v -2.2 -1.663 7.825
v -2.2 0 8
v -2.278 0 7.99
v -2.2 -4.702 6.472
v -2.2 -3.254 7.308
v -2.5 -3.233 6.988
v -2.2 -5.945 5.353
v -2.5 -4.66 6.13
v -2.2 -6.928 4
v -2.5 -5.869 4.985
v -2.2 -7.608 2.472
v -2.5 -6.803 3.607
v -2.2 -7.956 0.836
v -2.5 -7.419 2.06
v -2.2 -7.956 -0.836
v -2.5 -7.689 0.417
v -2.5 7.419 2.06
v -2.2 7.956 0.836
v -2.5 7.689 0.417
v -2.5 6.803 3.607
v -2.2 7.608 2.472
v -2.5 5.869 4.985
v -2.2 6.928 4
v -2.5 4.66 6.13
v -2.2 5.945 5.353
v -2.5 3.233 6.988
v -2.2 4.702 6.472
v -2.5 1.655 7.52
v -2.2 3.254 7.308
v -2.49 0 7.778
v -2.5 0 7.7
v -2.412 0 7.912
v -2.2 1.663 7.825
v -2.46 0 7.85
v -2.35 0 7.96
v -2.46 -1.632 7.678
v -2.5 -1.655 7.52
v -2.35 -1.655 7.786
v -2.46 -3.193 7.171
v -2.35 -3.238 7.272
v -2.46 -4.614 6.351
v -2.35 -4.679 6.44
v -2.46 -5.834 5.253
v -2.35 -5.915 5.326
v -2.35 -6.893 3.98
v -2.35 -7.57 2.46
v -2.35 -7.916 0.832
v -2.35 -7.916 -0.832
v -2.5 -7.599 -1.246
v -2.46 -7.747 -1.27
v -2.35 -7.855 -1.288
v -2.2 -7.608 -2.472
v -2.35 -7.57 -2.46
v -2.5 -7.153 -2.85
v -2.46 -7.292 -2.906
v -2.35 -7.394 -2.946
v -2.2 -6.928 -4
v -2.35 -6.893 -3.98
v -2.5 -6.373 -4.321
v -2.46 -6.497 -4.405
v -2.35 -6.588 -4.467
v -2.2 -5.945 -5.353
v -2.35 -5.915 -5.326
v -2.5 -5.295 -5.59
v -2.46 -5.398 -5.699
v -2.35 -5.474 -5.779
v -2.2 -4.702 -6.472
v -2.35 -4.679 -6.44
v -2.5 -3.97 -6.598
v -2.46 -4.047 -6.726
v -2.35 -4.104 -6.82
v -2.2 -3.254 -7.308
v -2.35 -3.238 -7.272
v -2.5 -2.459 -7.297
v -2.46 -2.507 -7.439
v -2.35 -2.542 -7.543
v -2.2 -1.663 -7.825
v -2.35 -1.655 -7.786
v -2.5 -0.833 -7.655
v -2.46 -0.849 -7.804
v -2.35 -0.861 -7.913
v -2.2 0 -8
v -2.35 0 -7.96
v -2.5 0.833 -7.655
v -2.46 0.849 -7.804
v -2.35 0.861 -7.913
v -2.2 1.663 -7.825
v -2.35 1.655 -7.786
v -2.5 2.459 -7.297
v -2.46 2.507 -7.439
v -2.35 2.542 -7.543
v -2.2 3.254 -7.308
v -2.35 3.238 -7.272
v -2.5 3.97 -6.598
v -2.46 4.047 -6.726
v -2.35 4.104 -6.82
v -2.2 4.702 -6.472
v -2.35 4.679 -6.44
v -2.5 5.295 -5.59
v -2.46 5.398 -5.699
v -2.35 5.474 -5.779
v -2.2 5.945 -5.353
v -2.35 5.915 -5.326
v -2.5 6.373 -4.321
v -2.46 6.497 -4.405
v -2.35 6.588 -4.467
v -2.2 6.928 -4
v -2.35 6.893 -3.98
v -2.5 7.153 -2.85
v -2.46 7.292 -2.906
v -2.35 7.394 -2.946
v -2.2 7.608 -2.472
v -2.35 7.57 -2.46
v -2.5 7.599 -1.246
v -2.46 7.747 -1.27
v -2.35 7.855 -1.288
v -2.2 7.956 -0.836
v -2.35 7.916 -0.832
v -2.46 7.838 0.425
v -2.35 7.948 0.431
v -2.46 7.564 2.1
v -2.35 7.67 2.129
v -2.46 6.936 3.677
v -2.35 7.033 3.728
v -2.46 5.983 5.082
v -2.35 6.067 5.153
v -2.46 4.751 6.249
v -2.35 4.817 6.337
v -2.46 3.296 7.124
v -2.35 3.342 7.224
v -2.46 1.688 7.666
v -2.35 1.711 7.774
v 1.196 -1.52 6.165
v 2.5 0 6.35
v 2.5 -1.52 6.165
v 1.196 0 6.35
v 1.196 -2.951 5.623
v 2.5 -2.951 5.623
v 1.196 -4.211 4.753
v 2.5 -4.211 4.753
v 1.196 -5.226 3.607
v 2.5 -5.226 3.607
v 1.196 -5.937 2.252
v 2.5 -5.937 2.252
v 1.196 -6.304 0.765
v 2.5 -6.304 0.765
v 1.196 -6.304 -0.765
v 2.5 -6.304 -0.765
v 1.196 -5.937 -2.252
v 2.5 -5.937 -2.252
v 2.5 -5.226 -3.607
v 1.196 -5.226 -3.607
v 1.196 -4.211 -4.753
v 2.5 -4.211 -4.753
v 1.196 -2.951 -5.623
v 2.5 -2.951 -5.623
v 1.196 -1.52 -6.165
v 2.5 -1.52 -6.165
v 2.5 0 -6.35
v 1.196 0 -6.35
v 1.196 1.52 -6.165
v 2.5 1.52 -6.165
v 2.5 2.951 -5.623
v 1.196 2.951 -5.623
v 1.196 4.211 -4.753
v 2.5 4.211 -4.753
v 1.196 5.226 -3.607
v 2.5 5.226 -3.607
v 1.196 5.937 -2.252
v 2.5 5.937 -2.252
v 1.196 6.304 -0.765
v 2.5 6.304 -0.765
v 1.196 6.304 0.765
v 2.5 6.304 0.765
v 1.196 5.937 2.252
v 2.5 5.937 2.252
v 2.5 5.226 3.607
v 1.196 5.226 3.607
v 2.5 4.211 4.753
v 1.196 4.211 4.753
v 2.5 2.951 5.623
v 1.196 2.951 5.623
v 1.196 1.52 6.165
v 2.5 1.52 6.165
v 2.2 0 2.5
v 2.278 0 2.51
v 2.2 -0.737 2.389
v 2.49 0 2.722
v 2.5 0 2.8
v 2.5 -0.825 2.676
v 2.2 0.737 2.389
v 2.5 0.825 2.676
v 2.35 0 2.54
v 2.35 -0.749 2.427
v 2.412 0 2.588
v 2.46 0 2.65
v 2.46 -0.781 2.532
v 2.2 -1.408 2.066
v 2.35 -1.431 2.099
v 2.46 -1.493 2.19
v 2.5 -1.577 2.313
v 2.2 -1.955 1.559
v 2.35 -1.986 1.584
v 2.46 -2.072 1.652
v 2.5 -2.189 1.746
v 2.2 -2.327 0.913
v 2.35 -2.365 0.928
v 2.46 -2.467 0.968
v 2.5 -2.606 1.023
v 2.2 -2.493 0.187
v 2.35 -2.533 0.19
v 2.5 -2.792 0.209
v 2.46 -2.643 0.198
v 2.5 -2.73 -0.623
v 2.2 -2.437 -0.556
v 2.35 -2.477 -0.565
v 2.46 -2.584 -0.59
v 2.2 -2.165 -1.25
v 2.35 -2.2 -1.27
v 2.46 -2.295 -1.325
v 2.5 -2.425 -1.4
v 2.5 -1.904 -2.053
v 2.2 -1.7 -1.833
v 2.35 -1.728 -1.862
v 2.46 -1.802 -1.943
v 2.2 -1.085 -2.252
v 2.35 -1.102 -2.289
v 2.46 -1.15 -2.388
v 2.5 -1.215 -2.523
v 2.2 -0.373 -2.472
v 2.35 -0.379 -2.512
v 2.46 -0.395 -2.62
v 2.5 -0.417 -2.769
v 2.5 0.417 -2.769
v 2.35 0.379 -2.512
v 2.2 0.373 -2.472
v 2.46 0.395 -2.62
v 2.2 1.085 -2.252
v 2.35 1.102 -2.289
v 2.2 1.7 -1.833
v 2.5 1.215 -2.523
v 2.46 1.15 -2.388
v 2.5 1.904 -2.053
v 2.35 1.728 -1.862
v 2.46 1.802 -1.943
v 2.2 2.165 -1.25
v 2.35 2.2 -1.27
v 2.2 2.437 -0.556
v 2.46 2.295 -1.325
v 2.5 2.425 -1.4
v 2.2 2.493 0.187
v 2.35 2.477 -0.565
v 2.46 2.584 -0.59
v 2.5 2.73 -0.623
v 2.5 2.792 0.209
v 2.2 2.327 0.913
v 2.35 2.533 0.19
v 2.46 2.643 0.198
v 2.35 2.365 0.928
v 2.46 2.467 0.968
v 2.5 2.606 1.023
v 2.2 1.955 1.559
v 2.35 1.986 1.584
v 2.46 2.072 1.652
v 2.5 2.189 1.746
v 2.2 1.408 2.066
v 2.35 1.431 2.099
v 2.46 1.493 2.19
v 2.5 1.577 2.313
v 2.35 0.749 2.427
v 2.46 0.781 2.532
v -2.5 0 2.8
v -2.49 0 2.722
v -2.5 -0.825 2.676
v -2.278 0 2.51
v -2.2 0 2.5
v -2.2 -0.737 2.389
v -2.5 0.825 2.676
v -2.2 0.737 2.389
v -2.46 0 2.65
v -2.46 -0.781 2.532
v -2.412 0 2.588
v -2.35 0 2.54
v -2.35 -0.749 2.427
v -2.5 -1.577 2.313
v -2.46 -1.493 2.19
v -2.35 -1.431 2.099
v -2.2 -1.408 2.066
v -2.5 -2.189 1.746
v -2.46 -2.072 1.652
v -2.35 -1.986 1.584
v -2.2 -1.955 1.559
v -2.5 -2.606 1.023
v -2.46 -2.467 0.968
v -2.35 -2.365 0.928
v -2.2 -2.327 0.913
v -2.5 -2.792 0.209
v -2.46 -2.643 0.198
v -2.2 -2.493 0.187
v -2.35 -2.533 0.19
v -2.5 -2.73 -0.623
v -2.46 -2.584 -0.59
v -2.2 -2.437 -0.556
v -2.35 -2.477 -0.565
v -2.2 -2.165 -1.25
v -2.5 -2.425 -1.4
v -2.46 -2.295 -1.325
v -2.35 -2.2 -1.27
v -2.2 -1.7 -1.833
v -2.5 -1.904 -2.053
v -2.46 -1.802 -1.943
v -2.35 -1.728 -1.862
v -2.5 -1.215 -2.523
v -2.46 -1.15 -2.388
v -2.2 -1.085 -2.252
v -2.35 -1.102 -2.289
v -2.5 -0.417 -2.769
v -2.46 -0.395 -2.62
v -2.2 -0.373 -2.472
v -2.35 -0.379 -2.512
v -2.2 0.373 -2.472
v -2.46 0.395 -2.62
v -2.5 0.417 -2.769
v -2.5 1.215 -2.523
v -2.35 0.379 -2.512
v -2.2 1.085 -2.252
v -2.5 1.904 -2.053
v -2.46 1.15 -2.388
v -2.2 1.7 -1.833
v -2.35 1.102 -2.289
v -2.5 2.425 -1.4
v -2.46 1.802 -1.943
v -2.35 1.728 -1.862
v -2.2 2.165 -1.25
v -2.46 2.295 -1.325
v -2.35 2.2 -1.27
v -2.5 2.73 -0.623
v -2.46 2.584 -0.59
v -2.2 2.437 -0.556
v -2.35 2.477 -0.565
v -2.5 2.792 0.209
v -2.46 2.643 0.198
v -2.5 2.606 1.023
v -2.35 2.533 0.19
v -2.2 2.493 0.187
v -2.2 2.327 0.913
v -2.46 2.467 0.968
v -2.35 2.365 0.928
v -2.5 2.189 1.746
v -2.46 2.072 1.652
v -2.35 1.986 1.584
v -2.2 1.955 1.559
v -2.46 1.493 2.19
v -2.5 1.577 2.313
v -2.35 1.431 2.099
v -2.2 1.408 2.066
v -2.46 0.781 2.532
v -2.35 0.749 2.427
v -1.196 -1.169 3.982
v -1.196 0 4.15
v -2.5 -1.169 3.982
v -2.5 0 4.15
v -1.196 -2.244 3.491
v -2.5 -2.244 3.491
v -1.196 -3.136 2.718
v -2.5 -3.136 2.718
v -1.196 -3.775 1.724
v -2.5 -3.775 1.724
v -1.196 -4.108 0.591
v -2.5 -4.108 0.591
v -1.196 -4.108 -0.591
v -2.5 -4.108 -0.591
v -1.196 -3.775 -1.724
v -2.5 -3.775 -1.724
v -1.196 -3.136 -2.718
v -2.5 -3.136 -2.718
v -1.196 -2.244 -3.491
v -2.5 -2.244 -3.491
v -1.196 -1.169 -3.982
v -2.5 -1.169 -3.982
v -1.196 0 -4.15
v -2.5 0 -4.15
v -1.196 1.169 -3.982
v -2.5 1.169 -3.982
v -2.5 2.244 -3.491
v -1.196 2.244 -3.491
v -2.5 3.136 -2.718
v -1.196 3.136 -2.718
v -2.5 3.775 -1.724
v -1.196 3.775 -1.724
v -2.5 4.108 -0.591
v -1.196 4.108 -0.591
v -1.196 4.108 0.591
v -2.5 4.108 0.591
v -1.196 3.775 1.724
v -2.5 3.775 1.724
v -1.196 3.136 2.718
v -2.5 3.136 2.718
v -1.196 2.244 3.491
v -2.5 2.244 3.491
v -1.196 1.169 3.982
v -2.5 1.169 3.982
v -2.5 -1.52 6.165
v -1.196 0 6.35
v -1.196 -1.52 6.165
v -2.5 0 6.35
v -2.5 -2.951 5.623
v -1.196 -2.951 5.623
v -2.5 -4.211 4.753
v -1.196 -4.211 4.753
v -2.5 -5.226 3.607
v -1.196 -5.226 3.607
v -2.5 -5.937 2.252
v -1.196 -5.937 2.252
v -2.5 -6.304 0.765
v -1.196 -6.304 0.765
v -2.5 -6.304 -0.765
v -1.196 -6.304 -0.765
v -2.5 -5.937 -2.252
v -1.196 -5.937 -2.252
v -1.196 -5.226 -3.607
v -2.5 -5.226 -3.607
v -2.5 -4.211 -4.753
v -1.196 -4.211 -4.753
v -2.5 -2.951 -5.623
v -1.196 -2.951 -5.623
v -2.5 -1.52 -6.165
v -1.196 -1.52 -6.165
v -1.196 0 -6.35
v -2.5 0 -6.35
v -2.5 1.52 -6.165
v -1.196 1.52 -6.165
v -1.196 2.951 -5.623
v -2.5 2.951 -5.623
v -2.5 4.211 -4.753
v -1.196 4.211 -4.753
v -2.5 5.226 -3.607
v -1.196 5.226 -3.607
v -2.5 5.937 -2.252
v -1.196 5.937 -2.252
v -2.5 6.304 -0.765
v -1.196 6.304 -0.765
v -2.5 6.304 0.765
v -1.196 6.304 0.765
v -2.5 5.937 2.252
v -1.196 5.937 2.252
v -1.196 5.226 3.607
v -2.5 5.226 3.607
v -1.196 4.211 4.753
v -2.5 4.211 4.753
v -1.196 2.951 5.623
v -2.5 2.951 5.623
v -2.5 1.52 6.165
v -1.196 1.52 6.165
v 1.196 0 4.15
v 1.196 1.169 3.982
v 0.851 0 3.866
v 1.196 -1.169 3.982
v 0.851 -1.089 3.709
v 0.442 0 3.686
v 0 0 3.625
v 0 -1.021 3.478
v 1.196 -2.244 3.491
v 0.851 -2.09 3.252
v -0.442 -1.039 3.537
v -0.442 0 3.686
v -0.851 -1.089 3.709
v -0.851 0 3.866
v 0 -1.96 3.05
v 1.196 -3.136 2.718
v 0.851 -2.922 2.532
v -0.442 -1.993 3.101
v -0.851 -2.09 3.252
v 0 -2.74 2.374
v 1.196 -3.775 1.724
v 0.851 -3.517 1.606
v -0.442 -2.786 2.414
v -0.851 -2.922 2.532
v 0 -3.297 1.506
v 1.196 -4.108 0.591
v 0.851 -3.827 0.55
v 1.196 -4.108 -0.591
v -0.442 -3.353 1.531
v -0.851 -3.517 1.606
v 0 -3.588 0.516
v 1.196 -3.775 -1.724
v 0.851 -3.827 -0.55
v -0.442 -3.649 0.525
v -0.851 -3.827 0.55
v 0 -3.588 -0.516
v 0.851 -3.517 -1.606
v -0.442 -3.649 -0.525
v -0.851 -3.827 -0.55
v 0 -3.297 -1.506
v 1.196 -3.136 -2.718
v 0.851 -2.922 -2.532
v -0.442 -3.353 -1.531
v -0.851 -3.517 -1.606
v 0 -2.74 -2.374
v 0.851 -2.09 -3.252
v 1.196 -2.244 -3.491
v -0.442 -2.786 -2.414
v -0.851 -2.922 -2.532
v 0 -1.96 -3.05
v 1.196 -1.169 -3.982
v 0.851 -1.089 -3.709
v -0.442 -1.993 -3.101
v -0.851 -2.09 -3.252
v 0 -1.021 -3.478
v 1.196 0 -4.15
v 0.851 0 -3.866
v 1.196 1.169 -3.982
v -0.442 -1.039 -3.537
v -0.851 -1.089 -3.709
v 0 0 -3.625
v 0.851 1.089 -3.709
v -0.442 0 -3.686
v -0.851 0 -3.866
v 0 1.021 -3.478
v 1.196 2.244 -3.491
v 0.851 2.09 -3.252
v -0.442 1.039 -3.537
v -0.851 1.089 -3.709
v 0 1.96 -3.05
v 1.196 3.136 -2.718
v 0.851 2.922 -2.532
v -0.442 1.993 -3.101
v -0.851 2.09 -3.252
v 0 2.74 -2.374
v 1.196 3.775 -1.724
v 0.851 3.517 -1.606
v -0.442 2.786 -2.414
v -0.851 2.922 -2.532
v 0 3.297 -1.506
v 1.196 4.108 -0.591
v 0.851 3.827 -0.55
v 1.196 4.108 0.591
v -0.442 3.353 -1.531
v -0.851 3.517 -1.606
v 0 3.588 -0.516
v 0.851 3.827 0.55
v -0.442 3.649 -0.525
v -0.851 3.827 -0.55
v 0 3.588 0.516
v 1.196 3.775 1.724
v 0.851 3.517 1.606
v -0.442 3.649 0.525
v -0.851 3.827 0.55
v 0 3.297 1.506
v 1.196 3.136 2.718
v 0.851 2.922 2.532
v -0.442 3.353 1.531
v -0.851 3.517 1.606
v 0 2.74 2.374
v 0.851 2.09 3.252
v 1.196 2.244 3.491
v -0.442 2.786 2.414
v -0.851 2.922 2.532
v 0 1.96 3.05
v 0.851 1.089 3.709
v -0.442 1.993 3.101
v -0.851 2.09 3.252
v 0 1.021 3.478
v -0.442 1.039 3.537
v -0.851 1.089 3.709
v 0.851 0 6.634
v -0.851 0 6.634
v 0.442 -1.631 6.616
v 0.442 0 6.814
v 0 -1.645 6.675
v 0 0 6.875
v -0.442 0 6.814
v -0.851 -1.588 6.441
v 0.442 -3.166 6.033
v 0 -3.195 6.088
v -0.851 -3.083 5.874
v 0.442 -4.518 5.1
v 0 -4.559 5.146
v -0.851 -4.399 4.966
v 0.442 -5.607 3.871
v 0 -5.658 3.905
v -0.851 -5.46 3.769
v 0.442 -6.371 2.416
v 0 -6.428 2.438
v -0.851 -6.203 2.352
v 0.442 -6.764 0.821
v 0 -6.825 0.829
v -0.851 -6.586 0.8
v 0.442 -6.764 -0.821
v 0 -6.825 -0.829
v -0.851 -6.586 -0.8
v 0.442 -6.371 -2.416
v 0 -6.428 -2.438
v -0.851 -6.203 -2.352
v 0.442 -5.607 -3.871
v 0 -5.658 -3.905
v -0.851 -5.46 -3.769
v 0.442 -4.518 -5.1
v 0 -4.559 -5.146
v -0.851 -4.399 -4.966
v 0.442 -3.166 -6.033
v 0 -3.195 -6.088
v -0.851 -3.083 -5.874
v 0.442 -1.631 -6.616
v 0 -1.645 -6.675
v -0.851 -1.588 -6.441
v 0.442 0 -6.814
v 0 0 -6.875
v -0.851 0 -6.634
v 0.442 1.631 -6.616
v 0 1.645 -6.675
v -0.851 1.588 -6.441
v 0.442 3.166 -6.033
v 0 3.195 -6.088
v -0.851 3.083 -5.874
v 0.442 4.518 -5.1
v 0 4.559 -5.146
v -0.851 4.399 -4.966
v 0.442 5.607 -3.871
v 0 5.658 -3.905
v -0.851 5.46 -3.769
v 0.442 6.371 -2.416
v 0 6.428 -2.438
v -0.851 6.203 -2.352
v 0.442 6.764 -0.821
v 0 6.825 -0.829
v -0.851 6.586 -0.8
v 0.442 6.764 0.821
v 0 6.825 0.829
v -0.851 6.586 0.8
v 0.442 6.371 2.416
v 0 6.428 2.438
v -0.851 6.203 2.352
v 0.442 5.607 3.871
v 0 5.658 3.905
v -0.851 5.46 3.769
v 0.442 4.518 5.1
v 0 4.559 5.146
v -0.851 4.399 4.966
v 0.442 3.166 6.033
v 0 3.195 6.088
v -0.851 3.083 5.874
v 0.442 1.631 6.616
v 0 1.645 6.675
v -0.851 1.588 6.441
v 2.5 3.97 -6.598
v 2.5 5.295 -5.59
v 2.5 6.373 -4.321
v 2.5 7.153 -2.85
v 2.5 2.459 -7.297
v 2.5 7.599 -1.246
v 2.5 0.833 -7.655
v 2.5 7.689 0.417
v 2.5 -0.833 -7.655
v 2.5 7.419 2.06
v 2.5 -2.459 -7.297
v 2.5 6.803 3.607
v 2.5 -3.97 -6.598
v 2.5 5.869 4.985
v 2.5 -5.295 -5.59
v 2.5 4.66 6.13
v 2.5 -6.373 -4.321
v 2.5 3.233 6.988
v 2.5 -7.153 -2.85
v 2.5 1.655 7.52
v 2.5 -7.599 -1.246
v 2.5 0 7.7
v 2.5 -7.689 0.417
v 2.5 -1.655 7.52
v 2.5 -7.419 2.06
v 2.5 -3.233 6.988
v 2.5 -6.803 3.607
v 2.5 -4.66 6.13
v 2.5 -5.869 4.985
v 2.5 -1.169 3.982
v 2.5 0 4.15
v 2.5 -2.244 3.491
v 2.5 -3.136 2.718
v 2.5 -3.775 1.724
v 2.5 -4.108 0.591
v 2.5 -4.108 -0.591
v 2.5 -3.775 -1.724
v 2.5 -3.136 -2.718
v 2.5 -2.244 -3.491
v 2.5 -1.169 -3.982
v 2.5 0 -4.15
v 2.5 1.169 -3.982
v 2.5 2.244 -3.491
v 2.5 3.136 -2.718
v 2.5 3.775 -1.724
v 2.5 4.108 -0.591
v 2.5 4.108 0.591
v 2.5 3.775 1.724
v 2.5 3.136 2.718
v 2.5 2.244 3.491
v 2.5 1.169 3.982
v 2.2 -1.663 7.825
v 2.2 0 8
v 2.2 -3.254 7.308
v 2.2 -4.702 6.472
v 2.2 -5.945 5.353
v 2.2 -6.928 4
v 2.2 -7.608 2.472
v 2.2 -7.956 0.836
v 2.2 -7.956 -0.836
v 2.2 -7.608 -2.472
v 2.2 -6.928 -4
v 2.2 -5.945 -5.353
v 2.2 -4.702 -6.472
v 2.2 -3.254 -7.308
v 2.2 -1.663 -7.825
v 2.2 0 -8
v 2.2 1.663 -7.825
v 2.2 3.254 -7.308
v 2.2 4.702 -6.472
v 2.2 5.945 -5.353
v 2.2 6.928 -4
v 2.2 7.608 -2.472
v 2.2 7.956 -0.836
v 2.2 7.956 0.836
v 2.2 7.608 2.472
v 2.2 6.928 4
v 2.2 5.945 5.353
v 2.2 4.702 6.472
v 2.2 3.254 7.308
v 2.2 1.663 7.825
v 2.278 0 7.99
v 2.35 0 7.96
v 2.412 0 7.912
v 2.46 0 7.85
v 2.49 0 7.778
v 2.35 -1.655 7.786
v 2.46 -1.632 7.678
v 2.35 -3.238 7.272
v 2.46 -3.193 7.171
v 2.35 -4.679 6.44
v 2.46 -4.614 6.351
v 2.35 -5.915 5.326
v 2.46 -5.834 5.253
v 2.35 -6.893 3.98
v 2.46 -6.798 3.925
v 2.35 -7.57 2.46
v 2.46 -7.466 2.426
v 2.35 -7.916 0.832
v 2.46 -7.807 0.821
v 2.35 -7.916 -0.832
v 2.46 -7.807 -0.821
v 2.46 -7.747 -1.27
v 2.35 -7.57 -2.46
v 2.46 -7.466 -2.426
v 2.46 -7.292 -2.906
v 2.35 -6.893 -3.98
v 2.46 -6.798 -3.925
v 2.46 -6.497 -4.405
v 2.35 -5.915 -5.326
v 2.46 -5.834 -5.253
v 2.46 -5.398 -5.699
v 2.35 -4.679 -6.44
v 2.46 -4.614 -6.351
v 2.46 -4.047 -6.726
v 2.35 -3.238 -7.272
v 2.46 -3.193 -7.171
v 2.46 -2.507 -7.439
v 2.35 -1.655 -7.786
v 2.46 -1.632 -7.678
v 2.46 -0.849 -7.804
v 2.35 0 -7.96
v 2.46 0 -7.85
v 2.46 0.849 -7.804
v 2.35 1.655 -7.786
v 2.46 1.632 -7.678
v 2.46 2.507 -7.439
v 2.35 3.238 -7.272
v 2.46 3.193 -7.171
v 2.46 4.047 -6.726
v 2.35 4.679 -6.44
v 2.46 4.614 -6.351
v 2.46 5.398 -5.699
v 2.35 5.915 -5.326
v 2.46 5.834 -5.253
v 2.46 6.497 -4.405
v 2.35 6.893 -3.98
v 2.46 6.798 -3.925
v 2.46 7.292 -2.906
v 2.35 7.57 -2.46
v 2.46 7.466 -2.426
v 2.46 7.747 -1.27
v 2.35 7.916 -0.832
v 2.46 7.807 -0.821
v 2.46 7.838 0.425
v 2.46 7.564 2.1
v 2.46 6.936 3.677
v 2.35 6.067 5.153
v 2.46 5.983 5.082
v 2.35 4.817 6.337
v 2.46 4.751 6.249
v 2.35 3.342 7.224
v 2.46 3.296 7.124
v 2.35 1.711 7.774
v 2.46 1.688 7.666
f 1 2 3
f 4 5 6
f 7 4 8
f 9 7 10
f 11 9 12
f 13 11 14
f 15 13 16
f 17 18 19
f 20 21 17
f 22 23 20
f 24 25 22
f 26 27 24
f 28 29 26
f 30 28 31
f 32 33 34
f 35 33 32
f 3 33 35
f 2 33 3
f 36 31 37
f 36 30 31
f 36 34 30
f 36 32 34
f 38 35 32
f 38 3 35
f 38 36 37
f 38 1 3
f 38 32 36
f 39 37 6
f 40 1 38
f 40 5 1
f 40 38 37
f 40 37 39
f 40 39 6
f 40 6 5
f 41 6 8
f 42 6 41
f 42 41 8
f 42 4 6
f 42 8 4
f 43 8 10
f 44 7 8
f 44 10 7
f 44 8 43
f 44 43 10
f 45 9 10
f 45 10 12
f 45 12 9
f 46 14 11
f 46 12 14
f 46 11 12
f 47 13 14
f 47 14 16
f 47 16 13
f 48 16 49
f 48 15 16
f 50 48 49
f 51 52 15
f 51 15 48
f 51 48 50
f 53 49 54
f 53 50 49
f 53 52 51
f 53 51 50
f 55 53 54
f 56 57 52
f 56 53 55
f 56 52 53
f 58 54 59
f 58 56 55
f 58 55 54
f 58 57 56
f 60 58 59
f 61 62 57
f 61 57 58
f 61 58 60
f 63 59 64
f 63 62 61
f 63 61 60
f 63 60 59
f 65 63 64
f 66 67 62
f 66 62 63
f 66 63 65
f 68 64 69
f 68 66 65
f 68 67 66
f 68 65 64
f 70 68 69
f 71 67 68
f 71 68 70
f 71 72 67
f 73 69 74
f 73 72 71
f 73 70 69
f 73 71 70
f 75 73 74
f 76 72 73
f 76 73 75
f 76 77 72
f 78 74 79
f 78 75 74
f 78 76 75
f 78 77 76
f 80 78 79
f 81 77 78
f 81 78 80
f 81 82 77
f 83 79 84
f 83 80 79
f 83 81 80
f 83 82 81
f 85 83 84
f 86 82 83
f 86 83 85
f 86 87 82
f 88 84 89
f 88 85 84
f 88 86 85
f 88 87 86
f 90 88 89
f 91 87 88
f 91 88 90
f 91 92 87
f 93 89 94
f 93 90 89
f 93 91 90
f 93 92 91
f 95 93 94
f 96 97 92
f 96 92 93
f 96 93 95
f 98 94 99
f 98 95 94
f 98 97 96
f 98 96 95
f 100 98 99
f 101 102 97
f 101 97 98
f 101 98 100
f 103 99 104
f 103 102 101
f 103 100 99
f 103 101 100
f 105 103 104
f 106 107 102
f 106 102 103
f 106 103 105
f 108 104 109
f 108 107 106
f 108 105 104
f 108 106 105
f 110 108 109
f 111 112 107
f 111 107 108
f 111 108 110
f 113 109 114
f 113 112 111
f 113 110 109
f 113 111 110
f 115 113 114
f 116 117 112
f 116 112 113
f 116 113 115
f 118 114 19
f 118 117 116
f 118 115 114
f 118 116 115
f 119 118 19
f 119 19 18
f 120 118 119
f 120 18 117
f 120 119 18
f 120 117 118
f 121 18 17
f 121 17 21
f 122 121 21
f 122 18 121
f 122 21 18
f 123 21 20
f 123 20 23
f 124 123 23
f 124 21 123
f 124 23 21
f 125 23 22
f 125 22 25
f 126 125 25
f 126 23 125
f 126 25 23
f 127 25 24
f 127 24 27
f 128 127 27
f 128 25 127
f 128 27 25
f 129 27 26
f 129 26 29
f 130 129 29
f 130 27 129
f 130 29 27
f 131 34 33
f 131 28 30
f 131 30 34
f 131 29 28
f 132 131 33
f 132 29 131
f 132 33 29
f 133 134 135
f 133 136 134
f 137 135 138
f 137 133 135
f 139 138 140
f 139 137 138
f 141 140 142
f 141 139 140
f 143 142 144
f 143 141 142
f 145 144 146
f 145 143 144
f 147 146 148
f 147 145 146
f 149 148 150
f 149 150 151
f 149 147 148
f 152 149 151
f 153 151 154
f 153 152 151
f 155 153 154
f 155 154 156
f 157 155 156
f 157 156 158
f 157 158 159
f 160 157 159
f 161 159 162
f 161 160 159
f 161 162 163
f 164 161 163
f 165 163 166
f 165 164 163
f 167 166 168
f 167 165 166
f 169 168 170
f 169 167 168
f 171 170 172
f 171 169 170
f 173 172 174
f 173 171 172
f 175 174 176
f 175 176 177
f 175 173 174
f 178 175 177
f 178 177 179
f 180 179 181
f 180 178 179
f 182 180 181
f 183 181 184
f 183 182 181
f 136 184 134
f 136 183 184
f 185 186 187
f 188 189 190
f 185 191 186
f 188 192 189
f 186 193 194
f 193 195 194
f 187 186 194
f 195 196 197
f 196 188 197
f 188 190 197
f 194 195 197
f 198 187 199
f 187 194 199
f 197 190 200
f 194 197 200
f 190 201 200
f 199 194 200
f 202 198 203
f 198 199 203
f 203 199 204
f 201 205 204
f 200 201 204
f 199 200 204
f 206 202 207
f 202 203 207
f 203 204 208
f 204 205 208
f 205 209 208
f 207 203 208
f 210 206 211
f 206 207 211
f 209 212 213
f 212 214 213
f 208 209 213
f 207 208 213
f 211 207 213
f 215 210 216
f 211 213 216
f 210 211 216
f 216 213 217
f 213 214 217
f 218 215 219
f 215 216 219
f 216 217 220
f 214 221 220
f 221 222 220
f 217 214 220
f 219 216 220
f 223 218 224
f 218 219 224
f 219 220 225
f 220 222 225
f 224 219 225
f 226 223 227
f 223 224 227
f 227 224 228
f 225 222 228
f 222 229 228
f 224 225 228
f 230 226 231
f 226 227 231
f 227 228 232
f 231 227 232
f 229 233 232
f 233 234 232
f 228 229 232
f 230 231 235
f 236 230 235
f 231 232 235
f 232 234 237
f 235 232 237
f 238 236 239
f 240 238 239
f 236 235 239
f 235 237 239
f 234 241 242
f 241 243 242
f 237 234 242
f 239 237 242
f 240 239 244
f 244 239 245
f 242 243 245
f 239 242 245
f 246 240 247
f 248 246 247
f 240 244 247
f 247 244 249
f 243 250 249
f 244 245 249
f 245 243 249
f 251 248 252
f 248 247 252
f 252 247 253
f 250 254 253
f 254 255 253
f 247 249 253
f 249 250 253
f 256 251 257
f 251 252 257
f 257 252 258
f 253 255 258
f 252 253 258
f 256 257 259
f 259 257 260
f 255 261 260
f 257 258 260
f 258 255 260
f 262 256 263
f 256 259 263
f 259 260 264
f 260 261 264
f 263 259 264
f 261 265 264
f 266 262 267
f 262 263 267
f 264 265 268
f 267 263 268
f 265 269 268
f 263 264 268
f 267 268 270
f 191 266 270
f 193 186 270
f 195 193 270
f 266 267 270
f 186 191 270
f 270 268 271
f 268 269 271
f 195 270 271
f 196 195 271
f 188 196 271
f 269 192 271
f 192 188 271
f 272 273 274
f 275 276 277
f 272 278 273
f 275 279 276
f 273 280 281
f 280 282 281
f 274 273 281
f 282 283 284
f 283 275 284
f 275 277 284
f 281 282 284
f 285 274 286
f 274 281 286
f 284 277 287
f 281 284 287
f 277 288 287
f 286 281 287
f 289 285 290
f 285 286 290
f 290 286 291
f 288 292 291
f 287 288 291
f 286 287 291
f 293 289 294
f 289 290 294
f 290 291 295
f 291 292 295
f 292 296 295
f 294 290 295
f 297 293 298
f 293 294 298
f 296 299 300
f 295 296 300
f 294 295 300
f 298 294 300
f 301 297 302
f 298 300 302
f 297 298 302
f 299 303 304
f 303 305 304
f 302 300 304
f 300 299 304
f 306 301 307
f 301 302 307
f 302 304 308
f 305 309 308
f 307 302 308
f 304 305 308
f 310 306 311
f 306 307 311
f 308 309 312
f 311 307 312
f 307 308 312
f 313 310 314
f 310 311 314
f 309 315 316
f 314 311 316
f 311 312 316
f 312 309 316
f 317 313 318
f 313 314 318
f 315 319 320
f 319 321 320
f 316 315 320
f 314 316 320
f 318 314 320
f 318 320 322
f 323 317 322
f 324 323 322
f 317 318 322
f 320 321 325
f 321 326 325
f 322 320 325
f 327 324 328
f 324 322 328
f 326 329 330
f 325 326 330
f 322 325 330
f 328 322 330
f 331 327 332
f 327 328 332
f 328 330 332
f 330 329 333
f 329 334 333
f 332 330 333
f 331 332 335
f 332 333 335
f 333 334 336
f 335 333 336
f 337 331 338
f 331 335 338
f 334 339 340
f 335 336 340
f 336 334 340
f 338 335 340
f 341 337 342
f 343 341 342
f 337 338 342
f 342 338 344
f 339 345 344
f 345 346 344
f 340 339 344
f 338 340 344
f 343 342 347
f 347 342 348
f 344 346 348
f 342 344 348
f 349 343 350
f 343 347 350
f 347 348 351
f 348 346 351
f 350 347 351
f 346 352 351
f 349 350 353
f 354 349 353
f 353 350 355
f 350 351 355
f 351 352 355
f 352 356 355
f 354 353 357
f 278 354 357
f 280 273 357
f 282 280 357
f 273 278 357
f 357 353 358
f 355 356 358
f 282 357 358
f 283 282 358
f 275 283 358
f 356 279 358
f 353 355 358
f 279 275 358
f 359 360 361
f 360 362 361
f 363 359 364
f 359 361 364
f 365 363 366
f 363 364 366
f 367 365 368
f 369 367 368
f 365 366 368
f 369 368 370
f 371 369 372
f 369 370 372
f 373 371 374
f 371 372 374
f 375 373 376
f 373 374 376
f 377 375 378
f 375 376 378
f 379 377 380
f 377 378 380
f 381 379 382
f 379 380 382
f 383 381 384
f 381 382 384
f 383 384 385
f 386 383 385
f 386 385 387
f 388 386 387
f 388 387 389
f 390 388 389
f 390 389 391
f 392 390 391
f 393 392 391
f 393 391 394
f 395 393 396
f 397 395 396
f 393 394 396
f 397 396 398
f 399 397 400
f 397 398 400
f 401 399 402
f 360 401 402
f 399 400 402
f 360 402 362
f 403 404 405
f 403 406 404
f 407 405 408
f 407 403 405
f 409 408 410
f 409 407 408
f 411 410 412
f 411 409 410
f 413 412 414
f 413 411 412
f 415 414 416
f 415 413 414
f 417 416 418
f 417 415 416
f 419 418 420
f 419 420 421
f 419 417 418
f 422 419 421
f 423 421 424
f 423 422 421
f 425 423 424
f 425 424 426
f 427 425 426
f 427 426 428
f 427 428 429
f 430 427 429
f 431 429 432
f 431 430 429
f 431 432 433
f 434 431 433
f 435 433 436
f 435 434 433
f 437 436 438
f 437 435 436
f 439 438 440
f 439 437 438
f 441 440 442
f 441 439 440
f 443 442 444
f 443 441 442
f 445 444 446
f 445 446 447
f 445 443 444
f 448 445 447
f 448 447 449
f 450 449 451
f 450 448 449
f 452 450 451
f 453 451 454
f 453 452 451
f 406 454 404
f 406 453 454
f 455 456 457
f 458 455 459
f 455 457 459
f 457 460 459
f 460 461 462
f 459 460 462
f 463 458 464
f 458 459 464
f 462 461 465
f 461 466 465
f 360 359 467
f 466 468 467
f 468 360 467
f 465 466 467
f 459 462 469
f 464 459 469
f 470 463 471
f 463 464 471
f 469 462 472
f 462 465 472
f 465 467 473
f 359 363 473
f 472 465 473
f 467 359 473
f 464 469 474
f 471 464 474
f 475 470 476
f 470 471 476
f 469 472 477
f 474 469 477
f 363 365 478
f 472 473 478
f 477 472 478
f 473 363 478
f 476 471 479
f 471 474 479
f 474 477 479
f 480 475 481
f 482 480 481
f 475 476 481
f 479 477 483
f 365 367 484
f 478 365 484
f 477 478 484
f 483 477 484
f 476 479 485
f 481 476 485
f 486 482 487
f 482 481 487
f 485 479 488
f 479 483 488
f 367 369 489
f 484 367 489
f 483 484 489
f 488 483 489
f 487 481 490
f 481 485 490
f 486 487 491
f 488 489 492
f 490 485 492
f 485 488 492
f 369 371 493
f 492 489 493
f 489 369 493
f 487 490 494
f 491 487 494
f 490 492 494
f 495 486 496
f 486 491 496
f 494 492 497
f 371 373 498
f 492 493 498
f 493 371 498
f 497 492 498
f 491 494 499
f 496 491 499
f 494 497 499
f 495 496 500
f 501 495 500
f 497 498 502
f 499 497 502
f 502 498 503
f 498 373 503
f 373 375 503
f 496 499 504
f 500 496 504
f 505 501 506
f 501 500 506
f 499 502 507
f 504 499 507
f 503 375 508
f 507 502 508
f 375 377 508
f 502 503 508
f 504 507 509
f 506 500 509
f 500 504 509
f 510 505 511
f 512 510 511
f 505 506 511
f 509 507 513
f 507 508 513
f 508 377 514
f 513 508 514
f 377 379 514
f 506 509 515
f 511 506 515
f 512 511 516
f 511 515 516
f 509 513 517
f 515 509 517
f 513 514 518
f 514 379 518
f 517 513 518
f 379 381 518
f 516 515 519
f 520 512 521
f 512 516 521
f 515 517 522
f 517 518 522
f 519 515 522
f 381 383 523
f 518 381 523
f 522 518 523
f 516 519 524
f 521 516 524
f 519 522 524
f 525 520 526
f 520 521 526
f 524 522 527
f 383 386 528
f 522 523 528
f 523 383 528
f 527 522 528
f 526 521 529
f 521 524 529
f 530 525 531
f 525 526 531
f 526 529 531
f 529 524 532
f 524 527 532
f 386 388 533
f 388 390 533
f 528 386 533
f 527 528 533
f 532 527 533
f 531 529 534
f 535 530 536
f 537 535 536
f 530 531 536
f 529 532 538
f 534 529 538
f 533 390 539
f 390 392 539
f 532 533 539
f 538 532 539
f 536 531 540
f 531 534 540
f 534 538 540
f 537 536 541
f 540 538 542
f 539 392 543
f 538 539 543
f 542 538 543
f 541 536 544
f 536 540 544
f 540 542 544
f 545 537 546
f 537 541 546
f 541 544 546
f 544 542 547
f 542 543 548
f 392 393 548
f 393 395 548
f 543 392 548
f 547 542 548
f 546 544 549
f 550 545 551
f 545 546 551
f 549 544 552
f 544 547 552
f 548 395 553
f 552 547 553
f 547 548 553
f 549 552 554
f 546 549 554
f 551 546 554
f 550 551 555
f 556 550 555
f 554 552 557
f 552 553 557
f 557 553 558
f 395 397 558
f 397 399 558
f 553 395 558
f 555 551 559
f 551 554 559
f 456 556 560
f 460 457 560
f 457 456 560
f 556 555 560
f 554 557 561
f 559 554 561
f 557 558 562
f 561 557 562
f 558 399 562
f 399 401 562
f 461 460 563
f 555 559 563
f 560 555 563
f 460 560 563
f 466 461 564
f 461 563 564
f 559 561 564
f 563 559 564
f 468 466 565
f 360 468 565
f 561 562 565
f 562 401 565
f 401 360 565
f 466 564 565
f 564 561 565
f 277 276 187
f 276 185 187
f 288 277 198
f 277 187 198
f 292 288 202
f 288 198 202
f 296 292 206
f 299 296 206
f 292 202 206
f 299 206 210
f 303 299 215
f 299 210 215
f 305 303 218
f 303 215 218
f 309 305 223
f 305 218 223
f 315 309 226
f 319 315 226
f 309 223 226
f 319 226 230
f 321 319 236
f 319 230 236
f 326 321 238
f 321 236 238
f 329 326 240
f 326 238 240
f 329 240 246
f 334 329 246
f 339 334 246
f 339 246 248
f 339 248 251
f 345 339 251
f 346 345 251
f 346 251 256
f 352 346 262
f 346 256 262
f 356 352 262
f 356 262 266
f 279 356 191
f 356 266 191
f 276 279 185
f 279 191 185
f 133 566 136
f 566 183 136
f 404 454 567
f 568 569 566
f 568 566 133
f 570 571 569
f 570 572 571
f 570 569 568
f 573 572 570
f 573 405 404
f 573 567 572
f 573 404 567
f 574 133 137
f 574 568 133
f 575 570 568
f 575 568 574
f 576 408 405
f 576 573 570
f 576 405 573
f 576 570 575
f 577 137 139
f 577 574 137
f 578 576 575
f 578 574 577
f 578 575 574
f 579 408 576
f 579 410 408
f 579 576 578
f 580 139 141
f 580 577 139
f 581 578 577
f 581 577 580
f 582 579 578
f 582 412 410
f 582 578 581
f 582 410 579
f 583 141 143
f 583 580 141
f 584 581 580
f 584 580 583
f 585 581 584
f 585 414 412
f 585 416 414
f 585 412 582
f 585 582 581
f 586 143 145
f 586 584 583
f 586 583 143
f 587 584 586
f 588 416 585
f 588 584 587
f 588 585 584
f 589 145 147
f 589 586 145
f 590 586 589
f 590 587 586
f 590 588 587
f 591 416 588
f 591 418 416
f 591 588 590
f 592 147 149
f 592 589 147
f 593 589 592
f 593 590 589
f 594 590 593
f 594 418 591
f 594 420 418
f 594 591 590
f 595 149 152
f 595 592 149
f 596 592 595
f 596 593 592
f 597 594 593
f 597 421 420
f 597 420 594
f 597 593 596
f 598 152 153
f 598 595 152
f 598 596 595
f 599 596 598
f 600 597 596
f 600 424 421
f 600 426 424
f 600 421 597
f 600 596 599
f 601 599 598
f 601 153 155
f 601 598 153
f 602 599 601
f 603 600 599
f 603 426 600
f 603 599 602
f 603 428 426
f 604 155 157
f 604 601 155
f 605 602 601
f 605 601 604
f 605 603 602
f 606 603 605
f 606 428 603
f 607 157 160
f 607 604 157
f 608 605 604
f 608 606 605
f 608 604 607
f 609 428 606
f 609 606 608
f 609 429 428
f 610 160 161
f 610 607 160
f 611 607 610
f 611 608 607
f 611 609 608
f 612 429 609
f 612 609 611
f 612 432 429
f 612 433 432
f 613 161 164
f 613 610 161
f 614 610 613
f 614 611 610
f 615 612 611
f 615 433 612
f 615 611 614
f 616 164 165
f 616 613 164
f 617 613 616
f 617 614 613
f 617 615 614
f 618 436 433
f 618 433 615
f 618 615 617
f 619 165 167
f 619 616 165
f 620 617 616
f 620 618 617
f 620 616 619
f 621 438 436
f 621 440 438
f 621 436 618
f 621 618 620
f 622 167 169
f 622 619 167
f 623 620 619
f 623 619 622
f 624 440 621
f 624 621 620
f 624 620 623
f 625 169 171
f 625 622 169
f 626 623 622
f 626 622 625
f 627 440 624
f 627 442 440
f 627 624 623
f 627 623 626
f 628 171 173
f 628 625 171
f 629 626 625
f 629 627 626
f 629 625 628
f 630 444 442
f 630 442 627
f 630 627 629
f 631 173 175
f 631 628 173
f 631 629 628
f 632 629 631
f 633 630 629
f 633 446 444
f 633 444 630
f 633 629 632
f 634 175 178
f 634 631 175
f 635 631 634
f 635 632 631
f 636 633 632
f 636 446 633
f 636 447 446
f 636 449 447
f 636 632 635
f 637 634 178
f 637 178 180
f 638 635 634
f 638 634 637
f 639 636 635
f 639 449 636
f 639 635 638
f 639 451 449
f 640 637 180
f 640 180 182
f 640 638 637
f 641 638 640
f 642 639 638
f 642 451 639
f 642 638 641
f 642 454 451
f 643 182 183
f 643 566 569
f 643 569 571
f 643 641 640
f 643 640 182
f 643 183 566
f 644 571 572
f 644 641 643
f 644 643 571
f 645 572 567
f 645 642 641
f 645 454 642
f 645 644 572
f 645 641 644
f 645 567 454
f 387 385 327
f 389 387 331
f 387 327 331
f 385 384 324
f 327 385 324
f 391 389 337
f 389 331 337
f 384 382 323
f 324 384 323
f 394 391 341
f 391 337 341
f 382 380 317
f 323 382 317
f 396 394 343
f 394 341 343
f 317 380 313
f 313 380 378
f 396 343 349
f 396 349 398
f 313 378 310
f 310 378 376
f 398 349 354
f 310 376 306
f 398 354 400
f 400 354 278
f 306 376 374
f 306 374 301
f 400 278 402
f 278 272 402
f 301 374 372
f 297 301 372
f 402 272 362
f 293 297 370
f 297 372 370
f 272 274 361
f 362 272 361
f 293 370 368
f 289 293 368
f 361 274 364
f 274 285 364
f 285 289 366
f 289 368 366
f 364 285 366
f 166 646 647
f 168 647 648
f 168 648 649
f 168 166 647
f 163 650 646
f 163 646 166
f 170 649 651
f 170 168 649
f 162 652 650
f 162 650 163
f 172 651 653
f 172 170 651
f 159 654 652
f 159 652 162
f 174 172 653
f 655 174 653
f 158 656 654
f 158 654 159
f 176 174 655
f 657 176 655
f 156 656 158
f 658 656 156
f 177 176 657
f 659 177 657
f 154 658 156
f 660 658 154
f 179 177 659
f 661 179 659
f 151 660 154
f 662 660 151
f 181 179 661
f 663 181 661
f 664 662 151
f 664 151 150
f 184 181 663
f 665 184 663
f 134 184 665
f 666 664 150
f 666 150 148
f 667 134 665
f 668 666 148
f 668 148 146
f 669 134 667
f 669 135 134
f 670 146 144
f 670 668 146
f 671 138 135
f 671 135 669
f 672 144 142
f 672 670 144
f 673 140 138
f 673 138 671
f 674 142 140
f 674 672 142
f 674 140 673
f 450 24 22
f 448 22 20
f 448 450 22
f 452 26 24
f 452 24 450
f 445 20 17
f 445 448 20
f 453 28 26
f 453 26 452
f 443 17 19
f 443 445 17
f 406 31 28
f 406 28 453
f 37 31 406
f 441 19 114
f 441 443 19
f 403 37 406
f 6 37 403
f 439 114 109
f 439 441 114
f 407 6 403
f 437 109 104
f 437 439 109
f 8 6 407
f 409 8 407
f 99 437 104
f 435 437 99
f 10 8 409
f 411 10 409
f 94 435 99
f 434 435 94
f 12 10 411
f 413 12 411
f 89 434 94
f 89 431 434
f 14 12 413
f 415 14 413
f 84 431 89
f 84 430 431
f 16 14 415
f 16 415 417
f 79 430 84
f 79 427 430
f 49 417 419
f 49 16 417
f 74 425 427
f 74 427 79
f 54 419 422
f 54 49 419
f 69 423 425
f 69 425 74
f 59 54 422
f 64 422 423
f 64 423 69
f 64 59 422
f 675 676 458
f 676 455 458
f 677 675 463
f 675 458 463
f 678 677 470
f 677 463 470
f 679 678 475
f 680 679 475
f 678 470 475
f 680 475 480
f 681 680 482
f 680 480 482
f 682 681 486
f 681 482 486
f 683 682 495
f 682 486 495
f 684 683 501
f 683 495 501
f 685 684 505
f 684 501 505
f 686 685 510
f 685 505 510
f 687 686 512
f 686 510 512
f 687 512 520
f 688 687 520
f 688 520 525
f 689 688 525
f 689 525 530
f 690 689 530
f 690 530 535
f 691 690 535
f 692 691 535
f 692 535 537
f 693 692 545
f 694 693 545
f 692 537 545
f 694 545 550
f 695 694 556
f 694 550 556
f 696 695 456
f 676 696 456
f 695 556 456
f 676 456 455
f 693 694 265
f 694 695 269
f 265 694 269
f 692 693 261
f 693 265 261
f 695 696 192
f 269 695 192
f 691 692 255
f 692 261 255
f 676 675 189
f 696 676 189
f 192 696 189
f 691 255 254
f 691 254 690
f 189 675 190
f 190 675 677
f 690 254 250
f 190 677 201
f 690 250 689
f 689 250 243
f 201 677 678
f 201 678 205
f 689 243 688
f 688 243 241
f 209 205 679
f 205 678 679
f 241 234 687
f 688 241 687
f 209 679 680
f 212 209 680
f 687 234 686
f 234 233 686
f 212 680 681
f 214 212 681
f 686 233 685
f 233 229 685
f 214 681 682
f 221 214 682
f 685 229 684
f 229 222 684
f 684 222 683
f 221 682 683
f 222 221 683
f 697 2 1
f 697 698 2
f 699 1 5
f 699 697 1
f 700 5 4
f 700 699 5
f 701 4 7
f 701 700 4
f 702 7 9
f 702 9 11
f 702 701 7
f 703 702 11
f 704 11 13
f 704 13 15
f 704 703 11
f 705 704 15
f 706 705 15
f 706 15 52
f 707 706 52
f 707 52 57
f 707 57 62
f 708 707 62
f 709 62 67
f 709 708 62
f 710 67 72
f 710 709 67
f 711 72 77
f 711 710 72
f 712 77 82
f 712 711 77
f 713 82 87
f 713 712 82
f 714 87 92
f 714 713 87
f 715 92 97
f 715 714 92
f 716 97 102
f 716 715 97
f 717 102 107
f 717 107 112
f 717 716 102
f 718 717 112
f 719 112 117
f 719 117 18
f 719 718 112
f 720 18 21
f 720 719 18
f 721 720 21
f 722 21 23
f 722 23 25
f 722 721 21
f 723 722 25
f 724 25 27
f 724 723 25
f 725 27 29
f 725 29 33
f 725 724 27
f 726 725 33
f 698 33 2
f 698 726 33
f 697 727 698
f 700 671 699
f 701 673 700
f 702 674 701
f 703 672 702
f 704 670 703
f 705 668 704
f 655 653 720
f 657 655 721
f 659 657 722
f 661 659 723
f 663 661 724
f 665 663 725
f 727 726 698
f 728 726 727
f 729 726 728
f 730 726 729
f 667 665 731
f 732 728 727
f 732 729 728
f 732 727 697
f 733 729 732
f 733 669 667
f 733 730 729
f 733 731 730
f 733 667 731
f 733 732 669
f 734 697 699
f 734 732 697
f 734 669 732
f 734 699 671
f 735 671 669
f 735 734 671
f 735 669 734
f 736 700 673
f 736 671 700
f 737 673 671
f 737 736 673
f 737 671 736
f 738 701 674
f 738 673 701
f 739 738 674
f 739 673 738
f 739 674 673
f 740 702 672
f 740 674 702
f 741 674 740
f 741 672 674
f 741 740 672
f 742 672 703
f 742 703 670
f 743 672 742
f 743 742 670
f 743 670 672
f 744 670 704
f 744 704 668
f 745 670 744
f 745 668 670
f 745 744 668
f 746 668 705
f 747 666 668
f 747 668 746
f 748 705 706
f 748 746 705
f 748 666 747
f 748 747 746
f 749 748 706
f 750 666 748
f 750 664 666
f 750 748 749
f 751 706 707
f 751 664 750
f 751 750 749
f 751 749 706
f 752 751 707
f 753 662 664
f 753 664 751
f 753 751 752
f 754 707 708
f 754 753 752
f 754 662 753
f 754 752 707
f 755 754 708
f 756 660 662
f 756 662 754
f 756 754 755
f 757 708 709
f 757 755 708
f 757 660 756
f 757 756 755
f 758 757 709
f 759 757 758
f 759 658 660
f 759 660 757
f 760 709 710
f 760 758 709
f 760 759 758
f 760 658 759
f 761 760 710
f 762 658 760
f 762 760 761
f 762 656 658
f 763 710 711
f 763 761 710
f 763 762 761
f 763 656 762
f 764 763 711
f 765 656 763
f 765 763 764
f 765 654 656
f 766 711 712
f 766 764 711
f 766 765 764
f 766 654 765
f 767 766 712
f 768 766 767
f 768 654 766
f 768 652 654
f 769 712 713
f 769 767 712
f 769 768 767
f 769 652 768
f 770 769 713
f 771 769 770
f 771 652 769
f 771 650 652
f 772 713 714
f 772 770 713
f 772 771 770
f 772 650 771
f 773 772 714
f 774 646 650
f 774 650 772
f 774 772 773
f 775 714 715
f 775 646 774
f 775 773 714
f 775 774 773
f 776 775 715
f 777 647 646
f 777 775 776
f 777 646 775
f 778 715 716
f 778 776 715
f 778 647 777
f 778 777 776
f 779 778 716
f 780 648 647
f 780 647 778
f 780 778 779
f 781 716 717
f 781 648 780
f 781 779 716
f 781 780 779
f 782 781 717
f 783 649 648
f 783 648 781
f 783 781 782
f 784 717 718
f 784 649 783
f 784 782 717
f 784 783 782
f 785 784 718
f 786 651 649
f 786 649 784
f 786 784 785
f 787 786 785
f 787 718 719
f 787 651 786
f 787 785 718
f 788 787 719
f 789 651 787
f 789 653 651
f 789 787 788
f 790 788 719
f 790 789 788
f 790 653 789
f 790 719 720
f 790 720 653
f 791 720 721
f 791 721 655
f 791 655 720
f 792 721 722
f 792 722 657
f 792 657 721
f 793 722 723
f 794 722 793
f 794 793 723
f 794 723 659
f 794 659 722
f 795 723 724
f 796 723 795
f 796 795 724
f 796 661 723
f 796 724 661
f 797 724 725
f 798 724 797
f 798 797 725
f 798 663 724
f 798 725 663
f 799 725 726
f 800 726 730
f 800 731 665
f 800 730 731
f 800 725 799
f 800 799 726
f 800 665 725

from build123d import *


with BuildPart() as part:
    # ralla → Revolve1 (revolve)
    with BuildSketch(Plane.XY, mode=Mode.PRIVATE) as revolve1_sk:
        with BuildLine():
            ThreePointArc((1.196087371, 6.35), (0, 6.875), (-1.196087371, 6.35))
            Line((-1.196087371, 6.35), (-2.5, 6.35))
            Line((-2.5, 6.35), (-2.5, 7.7))
            ThreePointArc((-2.5, 7.7), (-2.412132034, 7.912132034), (-2.2, 8))
            Line((-2.2, 8), (2.2, 8))
            ThreePointArc((2.2, 8), (2.412132034, 7.912132034), (2.5, 7.7))
            Line((2.5, 7.7), (2.5, 6.35))
            Line((2.5, 6.35), (1.196087371, 6.35))
        make_face()
        with BuildLine():
            Line((2.5, 4.15), (1.196087371, 4.15))
            ThreePointArc((1.196087371, 4.15), (0, 3.625), (-1.196087371, 4.15))
            Line((-1.196087371, 4.15), (-2.5, 4.15))
            Line((-2.5, 4.15), (-2.5, 2.8))
            ThreePointArc((-2.5, 2.8), (-2.412132034, 2.587867966), (-2.2, 2.5))
            Line((-2.2, 2.5), (2.2, 2.5))
            ThreePointArc((2.2, 2.5), (2.412132034, 2.587867966), (2.5, 2.8))
            Line((2.5, 2.8), (2.5, 4.15))
        make_face()
    revolve(revolve1_sk.sketch.rotate(Axis((-3.633751792, 0, 0), (1, 0, 0)), 90), axis=Axis((-3.633751792, 0, 0), (1, 0, 0)))


solid = part.part
